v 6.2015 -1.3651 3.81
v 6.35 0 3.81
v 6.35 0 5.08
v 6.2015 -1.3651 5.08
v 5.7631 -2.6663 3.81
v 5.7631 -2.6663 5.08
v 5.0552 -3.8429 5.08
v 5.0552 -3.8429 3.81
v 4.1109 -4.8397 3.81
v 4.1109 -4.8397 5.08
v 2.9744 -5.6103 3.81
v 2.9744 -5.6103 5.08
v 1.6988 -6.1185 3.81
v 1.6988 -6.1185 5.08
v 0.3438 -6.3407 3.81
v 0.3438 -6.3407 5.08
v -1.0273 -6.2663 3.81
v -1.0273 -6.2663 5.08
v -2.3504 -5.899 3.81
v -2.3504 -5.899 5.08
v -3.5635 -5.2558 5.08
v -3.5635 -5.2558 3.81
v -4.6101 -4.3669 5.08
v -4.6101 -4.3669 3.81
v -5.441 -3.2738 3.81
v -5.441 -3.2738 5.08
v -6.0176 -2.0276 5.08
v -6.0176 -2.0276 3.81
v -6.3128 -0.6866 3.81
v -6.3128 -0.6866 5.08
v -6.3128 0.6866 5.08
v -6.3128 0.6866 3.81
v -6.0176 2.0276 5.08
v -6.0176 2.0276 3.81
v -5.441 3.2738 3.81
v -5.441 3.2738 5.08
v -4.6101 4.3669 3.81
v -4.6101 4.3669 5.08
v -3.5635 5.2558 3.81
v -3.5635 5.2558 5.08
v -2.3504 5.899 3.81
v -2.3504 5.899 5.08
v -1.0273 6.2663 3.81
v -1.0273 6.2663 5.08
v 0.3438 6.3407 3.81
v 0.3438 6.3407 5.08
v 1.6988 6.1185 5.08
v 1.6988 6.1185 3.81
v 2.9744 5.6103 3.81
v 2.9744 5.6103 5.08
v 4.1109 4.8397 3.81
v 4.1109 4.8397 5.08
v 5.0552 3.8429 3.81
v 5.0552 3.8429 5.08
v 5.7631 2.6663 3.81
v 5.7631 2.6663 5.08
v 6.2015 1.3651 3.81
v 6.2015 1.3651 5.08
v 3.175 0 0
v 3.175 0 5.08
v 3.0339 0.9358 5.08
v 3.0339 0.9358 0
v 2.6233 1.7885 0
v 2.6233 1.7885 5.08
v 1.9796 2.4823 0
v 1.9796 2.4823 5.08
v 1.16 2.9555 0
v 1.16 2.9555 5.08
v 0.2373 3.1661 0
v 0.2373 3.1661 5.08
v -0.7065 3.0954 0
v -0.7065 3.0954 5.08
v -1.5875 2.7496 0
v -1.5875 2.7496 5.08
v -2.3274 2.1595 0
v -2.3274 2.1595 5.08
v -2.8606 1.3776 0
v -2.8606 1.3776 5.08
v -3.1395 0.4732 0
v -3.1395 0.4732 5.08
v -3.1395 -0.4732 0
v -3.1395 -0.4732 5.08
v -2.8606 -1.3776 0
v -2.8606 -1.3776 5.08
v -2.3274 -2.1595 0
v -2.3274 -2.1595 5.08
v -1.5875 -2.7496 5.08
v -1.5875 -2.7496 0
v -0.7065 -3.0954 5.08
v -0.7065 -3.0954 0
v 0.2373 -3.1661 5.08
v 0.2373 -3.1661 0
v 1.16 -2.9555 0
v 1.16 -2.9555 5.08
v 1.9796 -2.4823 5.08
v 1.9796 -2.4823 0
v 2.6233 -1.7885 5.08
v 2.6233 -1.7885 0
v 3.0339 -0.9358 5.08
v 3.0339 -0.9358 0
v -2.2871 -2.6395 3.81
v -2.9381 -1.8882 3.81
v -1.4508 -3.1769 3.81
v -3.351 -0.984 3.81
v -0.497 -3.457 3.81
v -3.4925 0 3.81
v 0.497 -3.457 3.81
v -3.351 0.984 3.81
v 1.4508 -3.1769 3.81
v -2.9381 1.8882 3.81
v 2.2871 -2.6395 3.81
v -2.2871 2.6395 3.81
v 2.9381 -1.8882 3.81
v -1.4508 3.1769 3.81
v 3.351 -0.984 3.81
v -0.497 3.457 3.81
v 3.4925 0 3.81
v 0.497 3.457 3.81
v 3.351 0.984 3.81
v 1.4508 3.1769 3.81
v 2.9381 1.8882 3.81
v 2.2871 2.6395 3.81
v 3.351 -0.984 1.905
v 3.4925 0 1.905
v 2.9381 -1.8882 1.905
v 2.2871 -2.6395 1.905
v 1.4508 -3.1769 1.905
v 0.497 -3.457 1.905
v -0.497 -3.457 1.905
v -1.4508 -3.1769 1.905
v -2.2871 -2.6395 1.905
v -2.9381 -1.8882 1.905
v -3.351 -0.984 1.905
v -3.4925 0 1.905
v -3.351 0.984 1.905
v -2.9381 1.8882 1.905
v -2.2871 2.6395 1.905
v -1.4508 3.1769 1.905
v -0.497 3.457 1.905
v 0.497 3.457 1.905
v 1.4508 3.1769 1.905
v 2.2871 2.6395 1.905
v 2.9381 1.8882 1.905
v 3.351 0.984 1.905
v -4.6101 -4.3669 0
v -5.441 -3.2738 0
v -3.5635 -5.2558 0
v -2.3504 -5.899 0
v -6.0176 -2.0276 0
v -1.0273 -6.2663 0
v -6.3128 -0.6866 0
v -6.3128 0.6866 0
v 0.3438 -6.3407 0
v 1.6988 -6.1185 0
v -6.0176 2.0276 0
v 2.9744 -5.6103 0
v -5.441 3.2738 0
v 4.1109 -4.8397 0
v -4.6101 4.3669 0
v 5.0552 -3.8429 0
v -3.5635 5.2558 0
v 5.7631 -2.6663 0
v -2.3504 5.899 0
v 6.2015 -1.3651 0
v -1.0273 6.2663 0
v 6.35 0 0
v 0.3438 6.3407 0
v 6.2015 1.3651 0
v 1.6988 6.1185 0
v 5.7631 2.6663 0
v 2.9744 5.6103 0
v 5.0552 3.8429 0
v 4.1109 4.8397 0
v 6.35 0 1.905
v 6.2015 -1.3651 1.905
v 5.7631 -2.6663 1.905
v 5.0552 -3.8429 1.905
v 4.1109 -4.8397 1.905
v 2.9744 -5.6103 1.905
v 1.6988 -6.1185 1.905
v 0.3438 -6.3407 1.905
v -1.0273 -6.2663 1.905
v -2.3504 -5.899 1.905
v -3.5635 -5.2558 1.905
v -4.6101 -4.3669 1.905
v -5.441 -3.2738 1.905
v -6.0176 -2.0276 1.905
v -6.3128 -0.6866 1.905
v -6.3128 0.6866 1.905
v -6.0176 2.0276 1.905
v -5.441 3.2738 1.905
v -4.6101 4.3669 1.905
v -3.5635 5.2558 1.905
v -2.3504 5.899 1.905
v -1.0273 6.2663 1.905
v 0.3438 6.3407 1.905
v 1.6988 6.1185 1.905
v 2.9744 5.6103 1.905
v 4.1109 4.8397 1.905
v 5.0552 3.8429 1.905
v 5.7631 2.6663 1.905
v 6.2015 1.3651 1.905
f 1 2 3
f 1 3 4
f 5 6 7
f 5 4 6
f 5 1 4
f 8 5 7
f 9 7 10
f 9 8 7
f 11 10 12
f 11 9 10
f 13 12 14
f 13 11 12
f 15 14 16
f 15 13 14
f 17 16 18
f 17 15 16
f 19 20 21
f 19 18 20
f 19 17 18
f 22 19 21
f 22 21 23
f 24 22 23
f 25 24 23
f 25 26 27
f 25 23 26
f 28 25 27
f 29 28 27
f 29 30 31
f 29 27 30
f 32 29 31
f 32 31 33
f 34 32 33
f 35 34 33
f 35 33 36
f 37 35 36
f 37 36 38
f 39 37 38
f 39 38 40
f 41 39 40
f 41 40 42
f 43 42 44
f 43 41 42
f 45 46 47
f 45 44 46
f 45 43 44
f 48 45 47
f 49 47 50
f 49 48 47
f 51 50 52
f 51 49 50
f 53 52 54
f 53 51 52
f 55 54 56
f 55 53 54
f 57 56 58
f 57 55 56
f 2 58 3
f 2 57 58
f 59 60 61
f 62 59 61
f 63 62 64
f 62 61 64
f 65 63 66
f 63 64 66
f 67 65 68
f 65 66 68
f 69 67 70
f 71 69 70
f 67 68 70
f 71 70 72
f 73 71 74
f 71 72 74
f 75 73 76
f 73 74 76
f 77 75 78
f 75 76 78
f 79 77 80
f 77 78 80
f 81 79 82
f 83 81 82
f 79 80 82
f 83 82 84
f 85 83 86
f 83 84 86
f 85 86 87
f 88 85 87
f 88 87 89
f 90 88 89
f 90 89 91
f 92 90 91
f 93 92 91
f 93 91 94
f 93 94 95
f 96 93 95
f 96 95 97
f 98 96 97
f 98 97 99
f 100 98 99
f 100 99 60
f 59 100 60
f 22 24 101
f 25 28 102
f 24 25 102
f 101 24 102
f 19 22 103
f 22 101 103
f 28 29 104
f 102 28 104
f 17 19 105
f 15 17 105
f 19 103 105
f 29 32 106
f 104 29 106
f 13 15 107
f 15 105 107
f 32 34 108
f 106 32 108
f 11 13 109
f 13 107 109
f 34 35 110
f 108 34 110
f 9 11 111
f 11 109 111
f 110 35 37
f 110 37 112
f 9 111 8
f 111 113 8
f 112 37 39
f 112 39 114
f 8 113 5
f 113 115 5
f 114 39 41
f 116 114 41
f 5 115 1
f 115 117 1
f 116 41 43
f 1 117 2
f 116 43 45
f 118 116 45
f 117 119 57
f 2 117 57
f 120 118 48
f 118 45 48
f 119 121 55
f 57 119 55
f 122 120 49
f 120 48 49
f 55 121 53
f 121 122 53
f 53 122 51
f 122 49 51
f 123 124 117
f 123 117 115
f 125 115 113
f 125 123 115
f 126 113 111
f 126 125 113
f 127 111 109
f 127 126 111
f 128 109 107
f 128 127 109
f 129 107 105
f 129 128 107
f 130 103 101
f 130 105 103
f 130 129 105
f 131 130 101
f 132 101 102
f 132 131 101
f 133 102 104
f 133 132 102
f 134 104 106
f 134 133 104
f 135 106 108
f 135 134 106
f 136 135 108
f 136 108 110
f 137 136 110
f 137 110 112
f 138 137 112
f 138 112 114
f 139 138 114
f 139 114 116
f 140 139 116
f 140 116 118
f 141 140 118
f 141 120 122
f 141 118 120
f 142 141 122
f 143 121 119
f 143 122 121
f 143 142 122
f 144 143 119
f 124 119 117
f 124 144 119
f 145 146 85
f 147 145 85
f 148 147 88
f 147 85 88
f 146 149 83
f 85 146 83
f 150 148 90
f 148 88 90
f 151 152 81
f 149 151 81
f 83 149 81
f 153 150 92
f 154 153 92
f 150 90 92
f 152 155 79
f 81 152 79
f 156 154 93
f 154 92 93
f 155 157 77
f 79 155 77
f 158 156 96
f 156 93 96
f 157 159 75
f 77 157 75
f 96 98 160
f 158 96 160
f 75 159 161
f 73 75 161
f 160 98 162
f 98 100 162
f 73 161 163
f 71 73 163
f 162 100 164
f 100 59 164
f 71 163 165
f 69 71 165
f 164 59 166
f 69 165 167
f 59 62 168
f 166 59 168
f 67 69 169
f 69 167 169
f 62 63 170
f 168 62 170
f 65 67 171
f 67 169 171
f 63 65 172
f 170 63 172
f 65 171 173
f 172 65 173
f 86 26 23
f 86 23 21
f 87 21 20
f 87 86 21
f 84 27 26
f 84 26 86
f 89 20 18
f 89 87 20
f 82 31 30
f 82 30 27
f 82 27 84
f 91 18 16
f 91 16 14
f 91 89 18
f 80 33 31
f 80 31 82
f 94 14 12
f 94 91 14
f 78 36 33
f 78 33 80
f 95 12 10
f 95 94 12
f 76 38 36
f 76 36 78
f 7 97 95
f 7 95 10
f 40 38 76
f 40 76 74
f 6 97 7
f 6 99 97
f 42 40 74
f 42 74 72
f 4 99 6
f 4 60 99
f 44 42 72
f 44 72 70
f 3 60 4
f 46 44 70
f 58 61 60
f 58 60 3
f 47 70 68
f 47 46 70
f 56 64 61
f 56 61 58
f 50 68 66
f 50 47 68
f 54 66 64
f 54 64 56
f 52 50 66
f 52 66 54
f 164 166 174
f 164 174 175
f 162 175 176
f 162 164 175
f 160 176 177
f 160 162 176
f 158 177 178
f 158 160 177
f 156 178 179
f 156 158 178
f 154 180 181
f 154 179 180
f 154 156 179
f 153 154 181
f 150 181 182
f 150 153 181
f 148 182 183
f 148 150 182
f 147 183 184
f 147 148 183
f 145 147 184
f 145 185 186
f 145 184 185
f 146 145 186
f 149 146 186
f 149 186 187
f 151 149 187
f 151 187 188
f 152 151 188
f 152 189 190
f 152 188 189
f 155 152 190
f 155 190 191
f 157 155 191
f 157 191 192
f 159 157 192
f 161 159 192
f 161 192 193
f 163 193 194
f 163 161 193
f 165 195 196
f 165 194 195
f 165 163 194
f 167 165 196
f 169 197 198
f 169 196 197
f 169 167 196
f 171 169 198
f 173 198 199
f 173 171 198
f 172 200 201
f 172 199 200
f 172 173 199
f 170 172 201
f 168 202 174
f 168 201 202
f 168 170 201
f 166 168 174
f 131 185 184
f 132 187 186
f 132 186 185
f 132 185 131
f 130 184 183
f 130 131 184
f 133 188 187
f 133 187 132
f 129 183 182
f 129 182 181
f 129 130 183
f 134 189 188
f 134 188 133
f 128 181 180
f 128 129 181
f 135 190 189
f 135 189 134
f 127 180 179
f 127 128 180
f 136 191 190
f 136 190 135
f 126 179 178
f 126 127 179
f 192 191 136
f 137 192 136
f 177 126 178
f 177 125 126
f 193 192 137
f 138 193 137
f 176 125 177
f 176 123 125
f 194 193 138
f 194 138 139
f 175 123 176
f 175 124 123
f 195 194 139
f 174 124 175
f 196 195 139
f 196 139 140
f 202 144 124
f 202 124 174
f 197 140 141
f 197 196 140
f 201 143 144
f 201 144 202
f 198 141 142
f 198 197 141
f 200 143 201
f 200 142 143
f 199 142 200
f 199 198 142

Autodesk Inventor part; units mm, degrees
ref_plane "YZ Plane" through (0, 0, 0) normal (1, 0, 0) x (0, 1, 0)
ref_plane "XZ Plane" through (0, 0, 0) normal (0, 1, 0) x (-1, 0, 0)
ref_plane "XY Plane" through (0, 0, 0) normal (0, 0, 1) x (1, 0, 0)
sketch "Sketch1" plane through (0, 0, 0) normal (0, 0, 1) x (1, 0, 0)
  circle A0 centre (0, 0) radius 6.35
  dimension "d0" = 12.7
extrude "Extrusion1" add sketch "Sketch1" along normal blind 1.905
sketch "Sketch2" plane through (0, 0, 1.905) normal (0, 0, 1) x (1, 0, 0)
  circle A0 centre (0, 0) radius 6.35 projected
  circle A1 centre (0, 0) radius 3.4925
  dimension "d3" = 6.985
extrude "Extrusion2" add sketch "Sketch2" along normal blind 1.905 contours A1
sketch "Sketch3" plane through (0, 0, 3.81) normal (0, 0, 1) x (1, 0, 0)
  circle A0 centre (0, 0) radius 3.4925 projected
  circle A1 centre (0, 0) radius 6.35 projected
  circle A2 centre (0, 0) radius 6.35
extrude "Extrusion3" add sketch "Sketch3" along normal blind 1.27 contours A0 | A1
sketch "Sketch4" plane through (0, 0, 5.08) normal (0, 0, 1) x (1, 0, 0)
  circle A0 centre (0, 0) radius 6.35 projected
  circle A1 centre (0, 0) radius 3.175
  dimension "d8" = 6.35
extrude "Extrusion4" cut sketch "Sketch4" against normal through all contours A1
properties part number "Pnewmatic Screw Part 2 1764"
